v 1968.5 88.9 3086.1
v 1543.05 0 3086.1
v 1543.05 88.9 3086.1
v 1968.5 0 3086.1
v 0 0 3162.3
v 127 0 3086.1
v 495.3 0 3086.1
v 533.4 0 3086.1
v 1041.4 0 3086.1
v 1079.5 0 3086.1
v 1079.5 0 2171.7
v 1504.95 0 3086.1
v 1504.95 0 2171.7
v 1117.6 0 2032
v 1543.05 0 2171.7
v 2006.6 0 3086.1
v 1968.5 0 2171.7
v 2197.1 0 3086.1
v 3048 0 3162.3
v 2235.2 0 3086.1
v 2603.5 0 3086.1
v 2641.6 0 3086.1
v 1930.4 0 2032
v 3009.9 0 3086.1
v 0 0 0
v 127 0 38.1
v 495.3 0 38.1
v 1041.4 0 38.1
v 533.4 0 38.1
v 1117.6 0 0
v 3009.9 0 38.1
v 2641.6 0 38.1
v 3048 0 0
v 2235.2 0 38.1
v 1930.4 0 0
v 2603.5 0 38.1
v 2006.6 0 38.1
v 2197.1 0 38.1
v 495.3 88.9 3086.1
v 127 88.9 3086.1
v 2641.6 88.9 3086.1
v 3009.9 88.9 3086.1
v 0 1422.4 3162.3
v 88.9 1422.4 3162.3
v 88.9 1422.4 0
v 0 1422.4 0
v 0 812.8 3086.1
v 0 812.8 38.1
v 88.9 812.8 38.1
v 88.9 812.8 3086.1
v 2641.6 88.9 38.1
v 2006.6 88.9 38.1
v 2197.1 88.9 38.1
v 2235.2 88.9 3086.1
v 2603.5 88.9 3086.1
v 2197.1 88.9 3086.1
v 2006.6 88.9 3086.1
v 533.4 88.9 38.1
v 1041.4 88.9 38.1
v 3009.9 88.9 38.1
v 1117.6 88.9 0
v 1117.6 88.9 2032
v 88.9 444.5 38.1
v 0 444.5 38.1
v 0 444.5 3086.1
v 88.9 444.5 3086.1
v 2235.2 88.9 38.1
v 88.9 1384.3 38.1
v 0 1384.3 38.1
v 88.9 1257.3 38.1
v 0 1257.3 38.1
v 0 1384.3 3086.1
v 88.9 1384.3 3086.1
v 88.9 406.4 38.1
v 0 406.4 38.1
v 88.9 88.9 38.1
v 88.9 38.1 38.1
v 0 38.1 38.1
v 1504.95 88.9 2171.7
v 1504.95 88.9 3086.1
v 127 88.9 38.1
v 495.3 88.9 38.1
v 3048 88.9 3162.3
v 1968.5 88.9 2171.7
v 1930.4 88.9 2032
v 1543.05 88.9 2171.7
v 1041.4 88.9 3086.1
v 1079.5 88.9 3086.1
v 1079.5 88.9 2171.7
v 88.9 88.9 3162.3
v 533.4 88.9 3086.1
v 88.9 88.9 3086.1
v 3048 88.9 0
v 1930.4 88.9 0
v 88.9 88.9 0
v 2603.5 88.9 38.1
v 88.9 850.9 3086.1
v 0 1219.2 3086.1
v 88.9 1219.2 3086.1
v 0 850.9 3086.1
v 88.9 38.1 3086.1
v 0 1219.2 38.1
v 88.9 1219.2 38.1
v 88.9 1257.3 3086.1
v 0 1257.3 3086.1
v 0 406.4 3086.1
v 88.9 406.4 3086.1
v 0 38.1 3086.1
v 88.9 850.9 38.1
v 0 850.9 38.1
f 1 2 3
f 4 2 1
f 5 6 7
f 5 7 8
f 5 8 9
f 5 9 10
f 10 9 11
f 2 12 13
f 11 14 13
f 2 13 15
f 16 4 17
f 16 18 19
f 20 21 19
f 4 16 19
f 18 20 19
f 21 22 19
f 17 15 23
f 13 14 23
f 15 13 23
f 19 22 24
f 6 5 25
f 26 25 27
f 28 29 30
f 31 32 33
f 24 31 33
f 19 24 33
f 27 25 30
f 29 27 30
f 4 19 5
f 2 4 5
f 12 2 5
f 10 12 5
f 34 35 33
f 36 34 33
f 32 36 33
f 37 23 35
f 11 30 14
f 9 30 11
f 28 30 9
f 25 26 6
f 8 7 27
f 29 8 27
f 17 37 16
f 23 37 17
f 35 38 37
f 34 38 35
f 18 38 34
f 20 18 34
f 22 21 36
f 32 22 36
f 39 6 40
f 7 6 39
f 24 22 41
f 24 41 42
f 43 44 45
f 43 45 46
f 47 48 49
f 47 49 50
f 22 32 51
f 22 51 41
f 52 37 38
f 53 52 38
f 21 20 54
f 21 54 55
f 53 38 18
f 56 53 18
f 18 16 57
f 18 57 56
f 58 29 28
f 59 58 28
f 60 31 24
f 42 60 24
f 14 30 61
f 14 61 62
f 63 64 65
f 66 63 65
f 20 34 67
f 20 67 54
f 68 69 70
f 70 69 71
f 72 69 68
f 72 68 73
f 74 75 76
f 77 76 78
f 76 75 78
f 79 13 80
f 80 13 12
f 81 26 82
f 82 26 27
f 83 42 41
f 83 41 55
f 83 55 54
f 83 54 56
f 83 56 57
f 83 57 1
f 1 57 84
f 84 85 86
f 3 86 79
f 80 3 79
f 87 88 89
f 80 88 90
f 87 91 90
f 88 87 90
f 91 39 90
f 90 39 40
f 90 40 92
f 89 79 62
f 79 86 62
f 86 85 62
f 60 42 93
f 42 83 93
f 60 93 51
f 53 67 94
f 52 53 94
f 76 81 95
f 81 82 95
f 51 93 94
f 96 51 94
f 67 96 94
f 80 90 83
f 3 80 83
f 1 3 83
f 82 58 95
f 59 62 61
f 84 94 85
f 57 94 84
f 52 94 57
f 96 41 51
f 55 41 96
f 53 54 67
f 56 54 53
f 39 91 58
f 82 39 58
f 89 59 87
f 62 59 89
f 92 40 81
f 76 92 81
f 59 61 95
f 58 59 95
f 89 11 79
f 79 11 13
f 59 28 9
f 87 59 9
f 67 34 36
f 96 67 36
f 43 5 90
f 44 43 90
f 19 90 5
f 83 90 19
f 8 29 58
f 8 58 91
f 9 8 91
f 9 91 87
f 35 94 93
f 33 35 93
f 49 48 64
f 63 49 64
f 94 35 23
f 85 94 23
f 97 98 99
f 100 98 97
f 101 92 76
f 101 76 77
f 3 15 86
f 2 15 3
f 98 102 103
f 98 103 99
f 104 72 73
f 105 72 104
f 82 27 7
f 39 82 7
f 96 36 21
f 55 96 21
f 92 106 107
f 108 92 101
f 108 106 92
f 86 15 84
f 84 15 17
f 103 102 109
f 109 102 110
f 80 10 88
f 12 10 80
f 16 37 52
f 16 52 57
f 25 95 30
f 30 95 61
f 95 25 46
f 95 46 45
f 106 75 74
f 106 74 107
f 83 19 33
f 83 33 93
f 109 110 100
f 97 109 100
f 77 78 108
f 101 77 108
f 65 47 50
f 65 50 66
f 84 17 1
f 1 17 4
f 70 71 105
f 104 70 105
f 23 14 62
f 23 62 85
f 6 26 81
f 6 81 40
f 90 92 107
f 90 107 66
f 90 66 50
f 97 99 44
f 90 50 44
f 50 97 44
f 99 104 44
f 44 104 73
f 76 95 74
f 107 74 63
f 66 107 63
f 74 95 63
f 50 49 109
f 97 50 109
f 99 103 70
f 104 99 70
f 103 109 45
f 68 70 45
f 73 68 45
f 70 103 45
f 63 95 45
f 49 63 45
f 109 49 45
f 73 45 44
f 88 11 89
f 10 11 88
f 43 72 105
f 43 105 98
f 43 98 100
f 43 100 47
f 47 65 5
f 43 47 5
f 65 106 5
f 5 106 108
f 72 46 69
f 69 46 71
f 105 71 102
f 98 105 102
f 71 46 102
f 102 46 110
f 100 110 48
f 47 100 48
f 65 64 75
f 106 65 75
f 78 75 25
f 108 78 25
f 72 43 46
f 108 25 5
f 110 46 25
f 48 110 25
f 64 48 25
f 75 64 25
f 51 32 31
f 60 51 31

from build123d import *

# Parameters (mm, degrees)
F1_DEPTH = 3162.3
F2_W     = 368.3
F2_H     = 3048
F2_W_2   = 127
F3_DEPTH = 88.9
F4_W     = 812.8
F4_H     = 2032
F5_DEPTH = 1422.401
F6_W     = 368.3
F6_H     = 3048
F6_W_2   = 508
F6_W_3   = 190.5
F6_W_4   = 425.45
F6_H_2   = 914.4
F7_DEPTH = 88.9


with BuildPart() as f1:
    # F0 (on Top) → F1 (new body)
    with BuildSketch(Plane.XY):
        Polygon((0, 1422.4), (0, 0), (3048, 0), (3048, 88.9), (88.9, 88.9), (88.9, 1422.4), align=None)
    extrude(amount=F1_DEPTH)

    # F2 (on face) → F3 (cut)
    with BuildSketch(Plane(origin=(0, 0, 0), x_dir=(0, -1, 0), z_dir=(-1, 0, 0))):
        with Locations((-222.25, 1562.1)):
            Rectangle(F2_W, F2_H)
        with Locations((-628.65, 1562.1)):
            Rectangle(F2_W, F2_H)
        with Locations((-1035.05, 1562.1)):
            Rectangle(F2_W, F2_H)
        with Locations((-1320.8, 1562.1)):
            Rectangle(F2_W_2, F2_H)
    extrude(amount=-F3_DEPTH, mode=Mode.SUBTRACT)

    # F4 (on face) → F5 (cut, through all)
    with BuildSketch(Plane.XZ):
        with Locations((1524, 1016)):
            Rectangle(F4_W, F4_H)
    extrude(amount=-F5_DEPTH, mode=Mode.SUBTRACT)

    # F6 (on face) → F7 (cut)
    with BuildSketch(Plane.XZ):
        with Locations((311.15, 1562.1)):
            Rectangle(F6_W, F6_H)
        with Locations((787.4, 1562.1)):
            Rectangle(F6_W_2, F6_H)
        with Locations((2825.75, 1562.1)):
            Rectangle(F6_W, F6_H)
        with Locations((2419.35, 1562.1)):
            Rectangle(F6_W, F6_H)
        with Locations((2101.85, 1562.1)):
            Rectangle(F6_W_3, F6_H)
        with Locations((1292.225, 2628.9)):
            Rectangle(F6_W_4, F6_H_2)
        with Locations((1755.775, 2628.9)):
            Rectangle(F6_W_4, F6_H_2)
    extrude(amount=-F7_DEPTH, mode=Mode.SUBTRACT)


solid = f1.part
